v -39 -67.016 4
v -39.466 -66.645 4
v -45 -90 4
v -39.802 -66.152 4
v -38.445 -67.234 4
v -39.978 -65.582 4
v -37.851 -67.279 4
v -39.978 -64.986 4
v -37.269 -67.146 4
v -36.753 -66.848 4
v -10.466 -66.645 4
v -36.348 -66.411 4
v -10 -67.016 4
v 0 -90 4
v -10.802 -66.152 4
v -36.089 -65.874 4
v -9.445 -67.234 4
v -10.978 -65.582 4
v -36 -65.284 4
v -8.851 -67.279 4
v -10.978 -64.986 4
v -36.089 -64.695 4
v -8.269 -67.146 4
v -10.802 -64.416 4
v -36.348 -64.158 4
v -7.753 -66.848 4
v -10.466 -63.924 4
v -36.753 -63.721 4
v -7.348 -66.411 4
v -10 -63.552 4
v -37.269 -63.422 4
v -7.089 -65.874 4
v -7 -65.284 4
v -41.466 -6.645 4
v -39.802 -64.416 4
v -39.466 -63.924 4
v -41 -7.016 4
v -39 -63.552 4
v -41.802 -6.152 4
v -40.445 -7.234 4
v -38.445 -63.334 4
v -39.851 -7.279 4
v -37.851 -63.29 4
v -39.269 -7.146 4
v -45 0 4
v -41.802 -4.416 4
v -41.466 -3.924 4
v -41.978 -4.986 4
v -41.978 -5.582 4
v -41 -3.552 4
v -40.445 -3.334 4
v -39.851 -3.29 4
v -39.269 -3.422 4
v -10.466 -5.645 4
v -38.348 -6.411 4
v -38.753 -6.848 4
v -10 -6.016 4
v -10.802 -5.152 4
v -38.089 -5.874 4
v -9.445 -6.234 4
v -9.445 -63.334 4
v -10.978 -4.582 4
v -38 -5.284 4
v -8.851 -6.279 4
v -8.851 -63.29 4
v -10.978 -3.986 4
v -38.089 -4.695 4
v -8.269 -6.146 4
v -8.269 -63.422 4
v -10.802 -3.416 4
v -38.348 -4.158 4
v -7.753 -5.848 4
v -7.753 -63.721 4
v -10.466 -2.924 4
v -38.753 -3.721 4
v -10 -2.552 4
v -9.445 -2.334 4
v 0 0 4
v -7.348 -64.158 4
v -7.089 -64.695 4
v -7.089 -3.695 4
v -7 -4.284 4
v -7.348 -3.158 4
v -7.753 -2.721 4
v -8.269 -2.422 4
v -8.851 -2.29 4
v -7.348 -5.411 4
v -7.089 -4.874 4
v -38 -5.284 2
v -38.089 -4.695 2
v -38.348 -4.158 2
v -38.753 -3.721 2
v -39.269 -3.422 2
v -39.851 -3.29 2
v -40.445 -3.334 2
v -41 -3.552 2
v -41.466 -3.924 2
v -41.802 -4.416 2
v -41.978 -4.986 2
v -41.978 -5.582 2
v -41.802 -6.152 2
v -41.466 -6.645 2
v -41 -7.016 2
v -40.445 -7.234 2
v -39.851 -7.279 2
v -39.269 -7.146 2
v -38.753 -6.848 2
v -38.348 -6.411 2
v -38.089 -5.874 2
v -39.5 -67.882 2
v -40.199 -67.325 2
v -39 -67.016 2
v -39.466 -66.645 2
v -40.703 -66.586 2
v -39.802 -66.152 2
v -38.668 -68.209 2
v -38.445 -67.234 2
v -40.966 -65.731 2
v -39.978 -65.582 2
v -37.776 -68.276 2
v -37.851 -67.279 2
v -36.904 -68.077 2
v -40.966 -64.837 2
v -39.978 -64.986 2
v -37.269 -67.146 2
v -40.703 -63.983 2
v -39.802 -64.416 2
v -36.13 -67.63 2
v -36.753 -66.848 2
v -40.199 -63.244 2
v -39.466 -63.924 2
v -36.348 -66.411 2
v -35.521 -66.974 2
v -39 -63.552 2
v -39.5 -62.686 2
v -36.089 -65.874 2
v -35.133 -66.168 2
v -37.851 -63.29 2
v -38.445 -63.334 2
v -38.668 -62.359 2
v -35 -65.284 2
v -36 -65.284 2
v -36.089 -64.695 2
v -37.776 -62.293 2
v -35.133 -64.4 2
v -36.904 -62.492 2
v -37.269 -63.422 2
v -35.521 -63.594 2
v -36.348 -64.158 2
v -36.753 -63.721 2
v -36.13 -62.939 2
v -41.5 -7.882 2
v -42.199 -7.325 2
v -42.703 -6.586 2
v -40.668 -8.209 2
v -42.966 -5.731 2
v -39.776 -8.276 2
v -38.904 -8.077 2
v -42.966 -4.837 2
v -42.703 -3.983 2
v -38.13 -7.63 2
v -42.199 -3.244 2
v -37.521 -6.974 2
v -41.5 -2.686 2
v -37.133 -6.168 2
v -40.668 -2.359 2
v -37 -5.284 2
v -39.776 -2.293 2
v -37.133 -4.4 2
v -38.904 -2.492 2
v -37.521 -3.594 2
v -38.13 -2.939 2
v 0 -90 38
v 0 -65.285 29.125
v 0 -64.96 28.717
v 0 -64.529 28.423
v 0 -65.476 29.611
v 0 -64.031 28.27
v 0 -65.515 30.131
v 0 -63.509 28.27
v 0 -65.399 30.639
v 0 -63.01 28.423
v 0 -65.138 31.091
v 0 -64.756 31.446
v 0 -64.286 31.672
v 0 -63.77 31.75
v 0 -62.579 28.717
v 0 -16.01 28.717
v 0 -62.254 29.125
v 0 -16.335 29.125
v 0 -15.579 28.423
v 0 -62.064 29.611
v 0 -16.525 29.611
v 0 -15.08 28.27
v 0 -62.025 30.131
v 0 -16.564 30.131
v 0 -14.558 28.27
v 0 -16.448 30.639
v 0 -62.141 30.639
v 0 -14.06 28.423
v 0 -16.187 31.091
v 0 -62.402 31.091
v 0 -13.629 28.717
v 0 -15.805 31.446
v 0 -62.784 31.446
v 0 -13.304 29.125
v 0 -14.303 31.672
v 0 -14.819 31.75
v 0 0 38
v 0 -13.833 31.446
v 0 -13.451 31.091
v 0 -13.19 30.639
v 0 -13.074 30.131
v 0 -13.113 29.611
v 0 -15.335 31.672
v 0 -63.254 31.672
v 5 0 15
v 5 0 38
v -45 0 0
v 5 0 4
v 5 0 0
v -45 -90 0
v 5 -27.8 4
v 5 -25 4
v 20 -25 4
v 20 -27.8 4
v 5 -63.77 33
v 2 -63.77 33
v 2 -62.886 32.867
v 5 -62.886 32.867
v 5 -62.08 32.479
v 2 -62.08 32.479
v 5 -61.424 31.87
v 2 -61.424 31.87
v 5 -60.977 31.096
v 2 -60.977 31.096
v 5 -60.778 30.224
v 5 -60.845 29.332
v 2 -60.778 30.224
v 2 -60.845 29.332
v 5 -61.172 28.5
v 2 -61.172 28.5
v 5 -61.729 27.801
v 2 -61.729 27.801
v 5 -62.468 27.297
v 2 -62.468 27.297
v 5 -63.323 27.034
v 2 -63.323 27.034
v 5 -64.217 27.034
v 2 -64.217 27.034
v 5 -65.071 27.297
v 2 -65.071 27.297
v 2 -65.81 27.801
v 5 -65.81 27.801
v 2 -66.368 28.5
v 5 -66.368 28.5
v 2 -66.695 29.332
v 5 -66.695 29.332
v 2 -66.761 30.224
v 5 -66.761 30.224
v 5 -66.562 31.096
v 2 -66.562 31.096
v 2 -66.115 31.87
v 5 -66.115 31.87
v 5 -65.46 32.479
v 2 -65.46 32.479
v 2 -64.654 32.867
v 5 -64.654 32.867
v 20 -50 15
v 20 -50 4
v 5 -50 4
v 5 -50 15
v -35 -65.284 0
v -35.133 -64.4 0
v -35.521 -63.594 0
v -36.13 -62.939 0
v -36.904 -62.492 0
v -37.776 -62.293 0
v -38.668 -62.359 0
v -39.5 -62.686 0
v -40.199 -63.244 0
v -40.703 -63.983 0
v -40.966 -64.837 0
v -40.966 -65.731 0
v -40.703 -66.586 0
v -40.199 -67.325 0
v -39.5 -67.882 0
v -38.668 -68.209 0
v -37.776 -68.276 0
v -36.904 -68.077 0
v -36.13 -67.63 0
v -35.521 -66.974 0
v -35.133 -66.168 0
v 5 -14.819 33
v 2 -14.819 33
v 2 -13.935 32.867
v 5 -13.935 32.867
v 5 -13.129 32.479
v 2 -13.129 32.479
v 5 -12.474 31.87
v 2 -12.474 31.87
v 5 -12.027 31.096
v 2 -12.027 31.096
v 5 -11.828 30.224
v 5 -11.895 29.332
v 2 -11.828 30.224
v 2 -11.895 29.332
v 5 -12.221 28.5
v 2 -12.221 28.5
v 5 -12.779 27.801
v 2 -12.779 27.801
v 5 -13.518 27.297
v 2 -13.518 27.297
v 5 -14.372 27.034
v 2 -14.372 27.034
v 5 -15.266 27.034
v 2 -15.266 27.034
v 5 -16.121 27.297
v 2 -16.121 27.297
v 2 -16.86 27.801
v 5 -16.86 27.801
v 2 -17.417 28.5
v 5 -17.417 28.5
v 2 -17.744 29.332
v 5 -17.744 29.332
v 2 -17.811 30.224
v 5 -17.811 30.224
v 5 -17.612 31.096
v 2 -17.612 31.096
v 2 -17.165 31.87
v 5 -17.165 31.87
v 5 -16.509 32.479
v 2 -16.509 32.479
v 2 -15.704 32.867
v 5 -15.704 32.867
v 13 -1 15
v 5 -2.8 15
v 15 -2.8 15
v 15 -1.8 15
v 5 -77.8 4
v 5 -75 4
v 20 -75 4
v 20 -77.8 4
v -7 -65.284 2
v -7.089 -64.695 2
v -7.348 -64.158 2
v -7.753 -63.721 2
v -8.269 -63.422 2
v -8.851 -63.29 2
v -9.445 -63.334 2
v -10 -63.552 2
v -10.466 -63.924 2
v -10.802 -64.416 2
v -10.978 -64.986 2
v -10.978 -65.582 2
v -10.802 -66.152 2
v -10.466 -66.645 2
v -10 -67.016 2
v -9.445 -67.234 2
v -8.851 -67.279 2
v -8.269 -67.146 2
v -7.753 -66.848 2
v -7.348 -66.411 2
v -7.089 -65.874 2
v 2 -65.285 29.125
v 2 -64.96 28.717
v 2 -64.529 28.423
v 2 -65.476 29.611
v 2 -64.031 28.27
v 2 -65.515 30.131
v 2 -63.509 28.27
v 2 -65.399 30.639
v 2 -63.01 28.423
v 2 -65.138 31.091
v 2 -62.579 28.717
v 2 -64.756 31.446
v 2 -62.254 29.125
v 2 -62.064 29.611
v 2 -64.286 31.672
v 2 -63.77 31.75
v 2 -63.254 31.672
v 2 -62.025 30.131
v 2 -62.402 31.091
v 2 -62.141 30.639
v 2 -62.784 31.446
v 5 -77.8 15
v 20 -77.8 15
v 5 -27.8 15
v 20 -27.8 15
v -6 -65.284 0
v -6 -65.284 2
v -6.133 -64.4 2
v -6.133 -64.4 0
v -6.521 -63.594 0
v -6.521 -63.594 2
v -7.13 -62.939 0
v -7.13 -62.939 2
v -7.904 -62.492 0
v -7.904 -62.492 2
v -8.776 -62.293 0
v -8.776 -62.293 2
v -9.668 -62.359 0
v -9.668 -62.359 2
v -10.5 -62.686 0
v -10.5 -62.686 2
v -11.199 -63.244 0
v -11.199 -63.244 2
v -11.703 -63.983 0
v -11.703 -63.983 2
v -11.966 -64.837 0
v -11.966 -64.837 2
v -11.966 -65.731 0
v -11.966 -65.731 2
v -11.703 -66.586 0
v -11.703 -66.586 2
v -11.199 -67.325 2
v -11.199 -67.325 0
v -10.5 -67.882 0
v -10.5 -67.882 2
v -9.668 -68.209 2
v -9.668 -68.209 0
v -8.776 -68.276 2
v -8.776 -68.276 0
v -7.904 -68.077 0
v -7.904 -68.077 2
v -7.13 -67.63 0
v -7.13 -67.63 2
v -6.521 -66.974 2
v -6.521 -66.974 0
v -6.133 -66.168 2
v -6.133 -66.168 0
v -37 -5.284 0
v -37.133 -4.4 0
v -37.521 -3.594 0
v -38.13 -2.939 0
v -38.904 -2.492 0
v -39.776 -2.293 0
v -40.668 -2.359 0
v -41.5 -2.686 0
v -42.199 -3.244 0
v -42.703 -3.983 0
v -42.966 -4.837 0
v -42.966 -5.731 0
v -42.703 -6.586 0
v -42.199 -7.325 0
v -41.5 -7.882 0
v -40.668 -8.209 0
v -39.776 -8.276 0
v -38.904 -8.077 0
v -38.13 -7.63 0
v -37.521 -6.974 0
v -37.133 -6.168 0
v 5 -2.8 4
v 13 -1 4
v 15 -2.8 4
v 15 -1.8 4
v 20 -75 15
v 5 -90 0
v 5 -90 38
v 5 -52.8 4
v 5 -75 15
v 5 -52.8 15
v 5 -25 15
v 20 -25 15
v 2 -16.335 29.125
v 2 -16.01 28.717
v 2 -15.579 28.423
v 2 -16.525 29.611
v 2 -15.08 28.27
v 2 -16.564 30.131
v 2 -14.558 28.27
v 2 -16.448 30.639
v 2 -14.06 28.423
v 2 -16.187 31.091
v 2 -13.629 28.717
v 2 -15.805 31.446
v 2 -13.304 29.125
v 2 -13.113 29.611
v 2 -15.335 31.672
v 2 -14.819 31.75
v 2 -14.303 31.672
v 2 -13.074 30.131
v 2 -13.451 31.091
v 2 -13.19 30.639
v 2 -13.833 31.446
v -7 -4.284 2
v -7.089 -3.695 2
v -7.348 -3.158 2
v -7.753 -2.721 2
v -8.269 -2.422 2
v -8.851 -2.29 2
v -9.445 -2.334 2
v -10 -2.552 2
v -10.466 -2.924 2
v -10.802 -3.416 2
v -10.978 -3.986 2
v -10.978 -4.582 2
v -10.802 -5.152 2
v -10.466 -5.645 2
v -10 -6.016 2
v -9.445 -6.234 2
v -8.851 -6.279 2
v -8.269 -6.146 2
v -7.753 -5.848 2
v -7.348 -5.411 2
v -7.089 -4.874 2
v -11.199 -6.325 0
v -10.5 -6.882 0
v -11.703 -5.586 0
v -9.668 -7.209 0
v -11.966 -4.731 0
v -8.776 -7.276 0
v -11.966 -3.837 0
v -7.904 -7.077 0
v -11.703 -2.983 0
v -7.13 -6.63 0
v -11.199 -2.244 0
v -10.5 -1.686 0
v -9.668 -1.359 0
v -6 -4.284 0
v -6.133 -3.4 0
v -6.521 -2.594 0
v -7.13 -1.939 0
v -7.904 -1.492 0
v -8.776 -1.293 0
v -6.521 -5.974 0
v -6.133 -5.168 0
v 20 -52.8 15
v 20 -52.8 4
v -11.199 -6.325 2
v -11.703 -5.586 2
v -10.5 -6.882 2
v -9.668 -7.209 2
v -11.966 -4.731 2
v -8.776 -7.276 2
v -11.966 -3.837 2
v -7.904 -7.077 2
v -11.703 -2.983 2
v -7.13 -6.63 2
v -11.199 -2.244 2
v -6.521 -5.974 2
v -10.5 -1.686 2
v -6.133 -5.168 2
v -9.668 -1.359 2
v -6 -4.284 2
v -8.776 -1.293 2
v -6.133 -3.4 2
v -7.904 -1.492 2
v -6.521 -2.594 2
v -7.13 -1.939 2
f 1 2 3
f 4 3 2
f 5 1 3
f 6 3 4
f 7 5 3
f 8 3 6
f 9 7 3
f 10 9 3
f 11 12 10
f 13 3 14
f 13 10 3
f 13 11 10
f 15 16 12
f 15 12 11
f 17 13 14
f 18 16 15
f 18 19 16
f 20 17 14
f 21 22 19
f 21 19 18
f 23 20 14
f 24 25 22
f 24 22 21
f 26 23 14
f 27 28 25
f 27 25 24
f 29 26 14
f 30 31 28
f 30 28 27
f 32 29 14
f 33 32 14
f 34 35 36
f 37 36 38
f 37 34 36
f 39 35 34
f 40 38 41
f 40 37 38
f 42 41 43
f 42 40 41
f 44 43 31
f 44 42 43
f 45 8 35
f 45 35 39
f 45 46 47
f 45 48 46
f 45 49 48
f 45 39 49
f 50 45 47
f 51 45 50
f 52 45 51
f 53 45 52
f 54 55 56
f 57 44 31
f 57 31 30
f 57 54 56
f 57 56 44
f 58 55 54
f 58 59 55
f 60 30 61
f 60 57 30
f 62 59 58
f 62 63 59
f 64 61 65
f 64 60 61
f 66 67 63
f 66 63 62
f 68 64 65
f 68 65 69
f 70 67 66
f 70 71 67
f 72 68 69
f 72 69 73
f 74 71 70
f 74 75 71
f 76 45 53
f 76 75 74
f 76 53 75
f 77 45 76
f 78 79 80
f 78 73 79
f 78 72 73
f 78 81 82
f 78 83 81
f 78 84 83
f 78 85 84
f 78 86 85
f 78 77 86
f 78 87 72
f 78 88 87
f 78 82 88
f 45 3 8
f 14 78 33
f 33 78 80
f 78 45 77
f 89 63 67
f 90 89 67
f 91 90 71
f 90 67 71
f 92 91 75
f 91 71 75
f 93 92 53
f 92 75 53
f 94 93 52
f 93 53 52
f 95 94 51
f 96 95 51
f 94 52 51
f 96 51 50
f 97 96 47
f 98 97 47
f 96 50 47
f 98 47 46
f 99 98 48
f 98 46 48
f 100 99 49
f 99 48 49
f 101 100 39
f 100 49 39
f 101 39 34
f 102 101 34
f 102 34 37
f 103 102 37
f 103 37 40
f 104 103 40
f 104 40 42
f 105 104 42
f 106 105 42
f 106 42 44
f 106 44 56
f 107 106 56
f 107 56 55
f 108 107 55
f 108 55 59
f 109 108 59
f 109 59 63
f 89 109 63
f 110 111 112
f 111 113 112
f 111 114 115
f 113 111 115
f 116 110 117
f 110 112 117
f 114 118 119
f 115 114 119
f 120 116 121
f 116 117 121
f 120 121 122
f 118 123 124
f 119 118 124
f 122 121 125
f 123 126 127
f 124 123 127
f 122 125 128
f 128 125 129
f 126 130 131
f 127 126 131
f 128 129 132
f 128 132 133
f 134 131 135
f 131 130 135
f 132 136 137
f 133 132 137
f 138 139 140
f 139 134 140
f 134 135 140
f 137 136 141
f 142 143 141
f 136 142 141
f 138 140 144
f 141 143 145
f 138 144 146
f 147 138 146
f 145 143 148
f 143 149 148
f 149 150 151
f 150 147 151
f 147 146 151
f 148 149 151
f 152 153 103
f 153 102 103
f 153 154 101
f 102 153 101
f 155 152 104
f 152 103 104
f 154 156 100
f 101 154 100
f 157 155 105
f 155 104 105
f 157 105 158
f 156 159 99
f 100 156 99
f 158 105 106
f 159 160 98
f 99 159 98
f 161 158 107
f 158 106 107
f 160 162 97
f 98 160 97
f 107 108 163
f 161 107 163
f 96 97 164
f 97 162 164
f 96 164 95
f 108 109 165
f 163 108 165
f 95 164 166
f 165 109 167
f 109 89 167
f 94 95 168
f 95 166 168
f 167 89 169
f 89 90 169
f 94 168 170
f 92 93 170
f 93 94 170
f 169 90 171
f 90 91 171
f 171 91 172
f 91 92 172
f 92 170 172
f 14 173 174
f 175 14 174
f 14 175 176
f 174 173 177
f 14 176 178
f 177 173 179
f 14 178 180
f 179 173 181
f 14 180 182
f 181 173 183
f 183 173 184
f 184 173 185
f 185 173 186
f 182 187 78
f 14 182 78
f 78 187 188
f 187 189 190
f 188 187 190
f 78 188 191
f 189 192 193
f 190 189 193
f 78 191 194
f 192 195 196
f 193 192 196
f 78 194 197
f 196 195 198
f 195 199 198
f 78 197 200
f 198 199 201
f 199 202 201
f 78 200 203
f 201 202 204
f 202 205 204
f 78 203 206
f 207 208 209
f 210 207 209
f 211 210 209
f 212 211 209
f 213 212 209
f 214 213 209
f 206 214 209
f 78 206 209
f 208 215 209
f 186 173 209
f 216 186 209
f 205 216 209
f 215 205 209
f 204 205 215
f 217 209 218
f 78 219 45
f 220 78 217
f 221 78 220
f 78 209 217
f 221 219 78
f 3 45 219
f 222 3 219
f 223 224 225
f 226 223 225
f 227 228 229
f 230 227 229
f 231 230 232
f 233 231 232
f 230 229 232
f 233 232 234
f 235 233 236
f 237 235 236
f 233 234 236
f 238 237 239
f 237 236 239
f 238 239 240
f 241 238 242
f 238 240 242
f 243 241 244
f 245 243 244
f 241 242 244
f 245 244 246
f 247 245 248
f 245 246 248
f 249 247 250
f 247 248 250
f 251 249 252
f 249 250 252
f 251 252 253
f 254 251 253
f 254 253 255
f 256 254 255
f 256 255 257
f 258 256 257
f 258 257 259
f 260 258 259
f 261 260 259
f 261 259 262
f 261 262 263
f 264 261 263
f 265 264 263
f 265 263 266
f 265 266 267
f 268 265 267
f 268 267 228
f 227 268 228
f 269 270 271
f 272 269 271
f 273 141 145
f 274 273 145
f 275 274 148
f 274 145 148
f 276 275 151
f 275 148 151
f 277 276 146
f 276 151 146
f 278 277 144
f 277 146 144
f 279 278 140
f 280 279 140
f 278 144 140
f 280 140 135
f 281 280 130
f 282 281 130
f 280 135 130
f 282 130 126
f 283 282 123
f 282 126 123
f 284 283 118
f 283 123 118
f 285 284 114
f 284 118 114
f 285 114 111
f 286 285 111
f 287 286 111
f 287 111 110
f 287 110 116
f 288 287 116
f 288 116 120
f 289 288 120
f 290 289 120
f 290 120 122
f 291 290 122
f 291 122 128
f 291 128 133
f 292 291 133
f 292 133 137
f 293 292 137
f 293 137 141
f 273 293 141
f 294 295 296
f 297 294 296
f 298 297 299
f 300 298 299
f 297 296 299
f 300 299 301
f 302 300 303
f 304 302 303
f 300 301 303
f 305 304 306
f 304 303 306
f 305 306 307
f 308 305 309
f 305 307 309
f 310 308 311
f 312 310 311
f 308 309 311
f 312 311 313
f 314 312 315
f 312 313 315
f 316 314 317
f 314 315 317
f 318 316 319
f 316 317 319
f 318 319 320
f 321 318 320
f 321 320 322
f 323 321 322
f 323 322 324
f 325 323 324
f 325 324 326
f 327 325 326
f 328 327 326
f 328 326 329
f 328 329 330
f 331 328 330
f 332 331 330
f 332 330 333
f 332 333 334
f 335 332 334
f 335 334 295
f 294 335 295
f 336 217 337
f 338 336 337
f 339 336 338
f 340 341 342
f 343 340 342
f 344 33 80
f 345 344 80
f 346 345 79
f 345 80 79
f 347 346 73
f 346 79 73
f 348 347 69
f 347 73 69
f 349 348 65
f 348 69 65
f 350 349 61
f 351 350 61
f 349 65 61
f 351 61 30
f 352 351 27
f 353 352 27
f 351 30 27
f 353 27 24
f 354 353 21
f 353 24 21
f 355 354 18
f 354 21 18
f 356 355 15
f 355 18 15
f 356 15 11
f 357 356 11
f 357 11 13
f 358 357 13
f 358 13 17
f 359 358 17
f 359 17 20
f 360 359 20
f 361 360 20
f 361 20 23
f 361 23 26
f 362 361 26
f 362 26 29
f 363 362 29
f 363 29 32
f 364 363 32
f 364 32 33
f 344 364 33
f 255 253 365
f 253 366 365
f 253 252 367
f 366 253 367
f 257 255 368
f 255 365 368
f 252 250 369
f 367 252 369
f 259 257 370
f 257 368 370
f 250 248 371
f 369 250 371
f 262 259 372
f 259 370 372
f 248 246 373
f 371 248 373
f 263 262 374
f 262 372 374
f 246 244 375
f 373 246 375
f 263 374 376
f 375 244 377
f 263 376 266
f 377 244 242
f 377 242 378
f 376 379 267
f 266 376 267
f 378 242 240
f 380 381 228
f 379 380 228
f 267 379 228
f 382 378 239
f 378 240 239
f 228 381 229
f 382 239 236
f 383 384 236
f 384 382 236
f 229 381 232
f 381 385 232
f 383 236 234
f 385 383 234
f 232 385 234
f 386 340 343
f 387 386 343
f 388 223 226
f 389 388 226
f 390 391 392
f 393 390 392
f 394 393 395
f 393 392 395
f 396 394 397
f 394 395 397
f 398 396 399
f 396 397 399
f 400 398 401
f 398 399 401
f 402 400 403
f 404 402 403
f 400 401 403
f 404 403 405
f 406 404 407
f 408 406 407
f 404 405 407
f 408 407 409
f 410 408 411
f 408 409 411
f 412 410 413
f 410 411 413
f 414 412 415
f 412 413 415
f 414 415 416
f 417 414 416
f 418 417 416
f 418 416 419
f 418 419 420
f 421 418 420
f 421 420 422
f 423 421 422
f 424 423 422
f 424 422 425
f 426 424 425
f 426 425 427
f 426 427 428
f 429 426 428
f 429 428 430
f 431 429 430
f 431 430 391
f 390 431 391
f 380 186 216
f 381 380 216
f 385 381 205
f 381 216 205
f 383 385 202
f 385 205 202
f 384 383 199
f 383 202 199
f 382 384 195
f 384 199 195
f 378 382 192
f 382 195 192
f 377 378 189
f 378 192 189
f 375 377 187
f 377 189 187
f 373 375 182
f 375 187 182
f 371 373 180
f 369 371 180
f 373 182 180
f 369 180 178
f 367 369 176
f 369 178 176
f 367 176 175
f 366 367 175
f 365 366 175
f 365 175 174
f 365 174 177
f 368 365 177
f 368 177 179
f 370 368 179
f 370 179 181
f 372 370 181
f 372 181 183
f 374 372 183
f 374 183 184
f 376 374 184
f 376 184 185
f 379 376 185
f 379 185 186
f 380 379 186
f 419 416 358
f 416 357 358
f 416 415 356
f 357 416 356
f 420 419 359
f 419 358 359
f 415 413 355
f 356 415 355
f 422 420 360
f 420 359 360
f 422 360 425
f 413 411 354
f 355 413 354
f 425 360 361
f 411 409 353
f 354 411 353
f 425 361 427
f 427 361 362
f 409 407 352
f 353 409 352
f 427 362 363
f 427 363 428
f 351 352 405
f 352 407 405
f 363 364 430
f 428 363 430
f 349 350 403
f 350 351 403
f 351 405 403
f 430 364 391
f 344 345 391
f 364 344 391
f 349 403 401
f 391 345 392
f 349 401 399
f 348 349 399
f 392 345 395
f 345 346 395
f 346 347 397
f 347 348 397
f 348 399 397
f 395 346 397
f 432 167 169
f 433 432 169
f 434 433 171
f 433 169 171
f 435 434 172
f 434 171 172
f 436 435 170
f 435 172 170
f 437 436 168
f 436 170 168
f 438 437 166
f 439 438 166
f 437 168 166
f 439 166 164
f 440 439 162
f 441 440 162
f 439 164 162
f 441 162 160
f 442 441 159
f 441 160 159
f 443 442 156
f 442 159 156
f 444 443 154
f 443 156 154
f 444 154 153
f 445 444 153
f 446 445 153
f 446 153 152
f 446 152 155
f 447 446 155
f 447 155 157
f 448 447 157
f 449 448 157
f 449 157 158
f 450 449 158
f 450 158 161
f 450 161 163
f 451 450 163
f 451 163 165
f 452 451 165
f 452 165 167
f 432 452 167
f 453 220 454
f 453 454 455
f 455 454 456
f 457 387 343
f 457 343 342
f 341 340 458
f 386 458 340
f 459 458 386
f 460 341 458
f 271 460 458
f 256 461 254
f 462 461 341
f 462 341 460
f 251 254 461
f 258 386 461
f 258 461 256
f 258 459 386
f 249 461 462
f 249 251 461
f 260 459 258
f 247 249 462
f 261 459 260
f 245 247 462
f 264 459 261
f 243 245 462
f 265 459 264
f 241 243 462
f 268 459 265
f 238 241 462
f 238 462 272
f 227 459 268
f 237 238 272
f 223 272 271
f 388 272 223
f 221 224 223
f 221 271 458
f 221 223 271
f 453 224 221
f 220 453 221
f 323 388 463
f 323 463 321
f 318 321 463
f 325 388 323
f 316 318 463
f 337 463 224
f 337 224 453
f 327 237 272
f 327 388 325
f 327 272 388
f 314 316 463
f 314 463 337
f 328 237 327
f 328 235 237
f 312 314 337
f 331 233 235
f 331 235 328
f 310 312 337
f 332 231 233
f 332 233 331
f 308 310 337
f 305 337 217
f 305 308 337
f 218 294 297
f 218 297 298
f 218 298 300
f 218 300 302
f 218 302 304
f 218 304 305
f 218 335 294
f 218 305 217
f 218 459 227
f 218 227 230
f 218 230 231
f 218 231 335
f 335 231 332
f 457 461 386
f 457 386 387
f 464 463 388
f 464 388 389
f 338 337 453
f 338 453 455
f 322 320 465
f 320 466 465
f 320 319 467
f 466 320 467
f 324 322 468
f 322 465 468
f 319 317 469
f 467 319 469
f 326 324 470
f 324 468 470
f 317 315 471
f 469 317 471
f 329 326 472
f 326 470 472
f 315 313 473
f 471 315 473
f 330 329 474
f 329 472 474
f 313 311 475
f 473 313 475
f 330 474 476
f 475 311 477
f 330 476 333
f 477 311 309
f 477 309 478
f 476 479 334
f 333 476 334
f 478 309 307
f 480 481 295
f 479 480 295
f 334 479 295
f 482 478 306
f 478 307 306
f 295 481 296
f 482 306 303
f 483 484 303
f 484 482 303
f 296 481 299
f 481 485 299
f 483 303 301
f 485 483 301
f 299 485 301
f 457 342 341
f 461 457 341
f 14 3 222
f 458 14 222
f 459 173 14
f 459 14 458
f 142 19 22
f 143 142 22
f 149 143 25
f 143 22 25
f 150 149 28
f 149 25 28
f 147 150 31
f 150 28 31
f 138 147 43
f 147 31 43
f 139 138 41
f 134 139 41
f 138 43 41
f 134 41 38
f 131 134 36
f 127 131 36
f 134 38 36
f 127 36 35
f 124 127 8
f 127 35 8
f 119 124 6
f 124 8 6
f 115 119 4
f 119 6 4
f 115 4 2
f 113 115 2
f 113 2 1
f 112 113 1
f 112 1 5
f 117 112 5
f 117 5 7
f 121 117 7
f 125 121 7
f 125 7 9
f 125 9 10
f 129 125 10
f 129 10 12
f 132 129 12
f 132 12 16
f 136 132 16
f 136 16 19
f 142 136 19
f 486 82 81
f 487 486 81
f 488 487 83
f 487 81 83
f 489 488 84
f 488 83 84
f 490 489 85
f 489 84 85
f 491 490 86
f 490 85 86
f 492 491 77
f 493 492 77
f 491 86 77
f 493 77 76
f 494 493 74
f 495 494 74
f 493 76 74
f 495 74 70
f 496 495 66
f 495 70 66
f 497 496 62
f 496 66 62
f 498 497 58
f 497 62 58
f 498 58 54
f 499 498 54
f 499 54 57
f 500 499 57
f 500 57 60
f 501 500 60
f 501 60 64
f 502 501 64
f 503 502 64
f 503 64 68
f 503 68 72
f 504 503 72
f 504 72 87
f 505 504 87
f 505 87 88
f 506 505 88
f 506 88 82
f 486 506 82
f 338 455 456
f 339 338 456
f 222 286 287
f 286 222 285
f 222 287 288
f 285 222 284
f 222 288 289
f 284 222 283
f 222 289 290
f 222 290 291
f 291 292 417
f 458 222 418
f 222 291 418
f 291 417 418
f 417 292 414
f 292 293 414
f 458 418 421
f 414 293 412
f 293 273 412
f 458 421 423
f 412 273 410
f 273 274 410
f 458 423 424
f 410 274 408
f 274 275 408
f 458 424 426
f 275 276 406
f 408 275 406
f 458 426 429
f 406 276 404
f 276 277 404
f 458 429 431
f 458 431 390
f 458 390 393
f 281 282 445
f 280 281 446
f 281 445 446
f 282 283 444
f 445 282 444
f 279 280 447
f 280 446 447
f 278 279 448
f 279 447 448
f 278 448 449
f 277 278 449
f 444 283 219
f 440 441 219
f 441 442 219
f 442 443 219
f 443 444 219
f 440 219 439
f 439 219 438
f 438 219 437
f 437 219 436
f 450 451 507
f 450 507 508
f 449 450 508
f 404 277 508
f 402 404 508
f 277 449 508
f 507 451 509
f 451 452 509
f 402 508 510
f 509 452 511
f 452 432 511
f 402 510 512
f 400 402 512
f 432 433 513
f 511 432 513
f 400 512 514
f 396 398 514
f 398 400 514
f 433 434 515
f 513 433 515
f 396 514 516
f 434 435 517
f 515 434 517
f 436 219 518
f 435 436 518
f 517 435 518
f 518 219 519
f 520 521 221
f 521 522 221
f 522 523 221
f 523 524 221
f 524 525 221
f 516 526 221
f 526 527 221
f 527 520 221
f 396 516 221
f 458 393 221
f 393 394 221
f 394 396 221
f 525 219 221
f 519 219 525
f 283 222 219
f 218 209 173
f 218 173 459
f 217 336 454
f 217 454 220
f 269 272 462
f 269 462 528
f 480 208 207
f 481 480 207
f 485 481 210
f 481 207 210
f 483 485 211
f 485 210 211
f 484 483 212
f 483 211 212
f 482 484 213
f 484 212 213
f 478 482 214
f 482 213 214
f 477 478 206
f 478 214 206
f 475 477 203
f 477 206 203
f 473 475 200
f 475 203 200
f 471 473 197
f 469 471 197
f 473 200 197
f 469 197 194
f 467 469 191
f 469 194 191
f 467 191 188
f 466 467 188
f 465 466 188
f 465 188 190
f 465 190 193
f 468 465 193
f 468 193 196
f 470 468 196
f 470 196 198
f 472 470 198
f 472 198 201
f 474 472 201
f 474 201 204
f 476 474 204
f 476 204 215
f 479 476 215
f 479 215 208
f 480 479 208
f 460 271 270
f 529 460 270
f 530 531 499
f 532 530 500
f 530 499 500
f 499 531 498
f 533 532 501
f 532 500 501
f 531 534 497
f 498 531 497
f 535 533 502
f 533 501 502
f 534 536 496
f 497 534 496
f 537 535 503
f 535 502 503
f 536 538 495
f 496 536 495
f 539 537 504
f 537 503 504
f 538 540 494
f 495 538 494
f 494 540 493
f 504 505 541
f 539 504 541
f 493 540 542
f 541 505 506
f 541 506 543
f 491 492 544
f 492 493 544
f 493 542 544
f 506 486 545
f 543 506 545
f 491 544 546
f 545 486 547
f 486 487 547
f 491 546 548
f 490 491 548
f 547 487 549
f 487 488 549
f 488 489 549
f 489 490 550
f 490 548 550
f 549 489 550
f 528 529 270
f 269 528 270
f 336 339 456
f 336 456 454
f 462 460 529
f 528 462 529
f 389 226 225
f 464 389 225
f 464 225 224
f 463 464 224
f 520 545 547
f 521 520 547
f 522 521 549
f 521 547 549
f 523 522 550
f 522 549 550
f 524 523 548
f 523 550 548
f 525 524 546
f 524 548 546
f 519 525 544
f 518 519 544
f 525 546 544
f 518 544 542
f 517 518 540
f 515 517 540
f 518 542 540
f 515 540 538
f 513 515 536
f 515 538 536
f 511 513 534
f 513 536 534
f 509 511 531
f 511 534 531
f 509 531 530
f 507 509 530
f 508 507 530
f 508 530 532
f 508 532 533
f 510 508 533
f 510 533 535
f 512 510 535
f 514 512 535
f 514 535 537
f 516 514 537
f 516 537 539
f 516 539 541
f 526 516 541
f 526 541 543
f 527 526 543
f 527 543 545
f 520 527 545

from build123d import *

# Parameters (mm, degrees)
EXTRUDE_1_DEPTH     = 38
EXTRUDE_1_2_DEPTH   = 38
EXTRUDE_7_DEPTH     = 38
SKETCH_13_W         = 45
SKETCH_13_H         = 4
EXTRUDE_9_DEPTH     = 90
SKETCH_1_4_W        = 5
SKETCH_1_4_H        = 2.2
EXTRUDE_10_DEPTH    = 38
SKETCH_11_R         = 1.75
CUT_EXTRUDE_2_DEPTH = 38
CUT_EXTRUDE_START   = -2
SKETCH_11_3_R       = 3
SKETCH_11_3_R_2     = 1.75
CUT_EXTRUDE_3_DEPTH = 38
SKETCH_15_R         = 2
CUT_EXTRUDE_4_DEPTH = 38
SKETCH_15_3_R       = 3
SKETCH_15_3_R_2     = 2
CUT_EXTRUDE_5_DEPTH = 38
SKETCH_17_W         = 15
SKETCH_17_H         = 2.8
EXTRUDE_12_DEPTH    = 23
SKETCH_18_W         = 2
SKETCH_18_H         = 1
CUT_EXTRUDE_6_DEPTH = 40
SKETCH_17_2_W       = 15
SKETCH_17_2_H       = 2.8
SKETCH_17_2_W_2     = 10
SKETCH_17_2_H_2     = 3.8
CUT_EXTRUDE_7_DEPTH = 23
SKETCH_20_W         = 15
SKETCH_20_H         = 4
CUT_EXTRUDE_8_DEPTH = 89
SKETCH_17_4_W       = 5
SKETCH_17_4_H       = 10
EXTRUDE_13_DEPTH    = 38


with BuildPart() as part:
    # 스케치1 → 보스-돌출1 (new body)
    with BuildSketch(Plane.XY):
        Polygon((15, -3.8), (15, -1.8), (13, -1), (13, -3.8), align=None)
    extrude(amount=EXTRUDE_1_DEPTH)



with BuildPart() as body_2:
    # 스케치1 → Extrude 1 2 (new body)
    with BuildSketch(Plane.XY):
        Polygon((5, -75), (5, -52.8), (20, -52.8), (20, -50), (5, -50), (5, -27.8), (20, -27.8), (20, -25), (5, -25), (5, 0), (0, 0), (0, -77.8), (20, -77.8), (20, -75), align=None)
    extrude(amount=EXTRUDE_1_2_DEPTH)


with BuildPart() as part_1:
    add(part.part)

    add(body_2.part)  # 보스-돌출7 merges body 2
    # 스케치1<3> → 보스-돌출7 (add)
    with BuildSketch(Plane.XY):
        Polygon((13, -2.8), (13, -1), (5, 0), (5, -0.74611229), (5, -2.8), align=None)
    extrude(amount=EXTRUDE_7_DEPTH)

    # 스케치13 → 보스-돌출9 (add)
    with BuildSketch(Plane(origin=(0, 0, 0), x_dir=(1, 0, 0), z_dir=(0, 1, 0))):
        with Locations((-22.5, -2)):
            Rectangle(SKETCH_13_W, SKETCH_13_H)
    extrude(amount=-EXTRUDE_9_DEPTH)

    # 스케치1<4> → 보스-돌출10 (add)
    with BuildSketch(Plane.XY):
        with Locations((2.5, -78.9)):
            Rectangle(SKETCH_1_4_W, SKETCH_1_4_H)
    extrude(amount=EXTRUDE_10_DEPTH)

    # 스케치11 → 컷-돌출2 (cut)
    with BuildSketch(Plane.ZY):
        with Locations((30, -63.769774624)):
            Circle(SKETCH_11_R)
        with Locations((30, -14.819294268)):
            Circle(SKETCH_11_R)
    extrude(amount=-CUT_EXTRUDE_2_DEPTH, mode=Mode.SUBTRACT)

    # 스케치11<3> → 컷-돌출3 (cut)
    with BuildSketch(Plane.ZY.offset(CUT_EXTRUDE_START)):
        with Locations((30, -63.769774624)):
            Circle(SKETCH_11_3_R)
        with Locations((30, -63.769774624)):
            Circle(SKETCH_11_3_R_2, mode=Mode.SUBTRACT)
        with Locations((30, -14.819294268)):
            Circle(SKETCH_11_3_R)
        with Locations((30, -14.819294268)):
            Circle(SKETCH_11_3_R_2, mode=Mode.SUBTRACT)
    extrude(amount=-CUT_EXTRUDE_3_DEPTH, mode=Mode.SUBTRACT)

    # 스케치15 → 컷-돌출4 (cut)
    with BuildSketch(Plane.XY.offset(4)):
        with Locations((-40, -5.284222689)):
            Circle(SKETCH_15_R)
        with Locations((-9, -4.284222689)):
            Circle(SKETCH_15_R)
        with Locations((-9, -65.284222689)):
            Circle(SKETCH_15_R)
        with Locations((-38, -65.284222689)):
            Circle(SKETCH_15_R)
    extrude(amount=-CUT_EXTRUDE_4_DEPTH, mode=Mode.SUBTRACT)

    # 스케치15<3> → 컷-돌출5 (cut)
    with BuildSketch(Plane.XY.offset(4).offset(CUT_EXTRUDE_START)):
        with Locations((-40, -5.284222689)):
            Circle(SKETCH_15_3_R)
        with Locations((-40, -5.284222689)):
            Circle(SKETCH_15_3_R_2, mode=Mode.SUBTRACT)
        with Locations((-38, -65.284222689)):
            Circle(SKETCH_15_3_R)
        with Locations((-38, -65.284222689)):
            Circle(SKETCH_15_3_R_2, mode=Mode.SUBTRACT)
        with Locations((-9, -65.284222689)):
            Circle(SKETCH_15_3_R)
        with Locations((-9, -65.284222689)):
            Circle(SKETCH_15_3_R_2, mode=Mode.SUBTRACT)
        with Locations((-9, -4.284222689)):
            Circle(SKETCH_15_3_R)
        with Locations((-9, -4.284222689)):
            Circle(SKETCH_15_3_R_2, mode=Mode.SUBTRACT)
    extrude(amount=-CUT_EXTRUDE_5_DEPTH, mode=Mode.SUBTRACT)

    # 스케치17 → 보스-돌출12 (add)
    with BuildSketch(Plane.XY.offset(38)):
        with Locations((12.5, -26.4)):
            Rectangle(SKETCH_17_W, SKETCH_17_H)
        with Locations((12.5, -51.4)):
            Rectangle(SKETCH_17_W, SKETCH_17_H)
        with Locations((12.5, -76.4)):
            Rectangle(SKETCH_17_W, SKETCH_17_H)
    extrude(amount=-EXTRUDE_12_DEPTH)

    # 스케치18 → 컷-돌출6 (cut)
    with BuildSketch(Plane.XY.offset(38)):
        with Locations((14, -3.3)):
            Rectangle(SKETCH_18_W, SKETCH_18_H)
    extrude(amount=-CUT_EXTRUDE_6_DEPTH, mode=Mode.SUBTRACT)

    # 스케치17<2> → 컷-돌출7 (cut)
    with BuildSketch(Plane.XY.offset(38)):
        with Locations((12.5, -76.4)):
            Rectangle(SKETCH_17_2_W, SKETCH_17_2_H)
        with Locations((12.5, -51.4)):
            Rectangle(SKETCH_17_2_W, SKETCH_17_2_H)
        with Locations((12.5, -26.4)):
            Rectangle(SKETCH_17_2_W, SKETCH_17_2_H)
        with Locations((10, -1.9)):
            Rectangle(SKETCH_17_2_W_2, SKETCH_17_2_H_2)
    extrude(amount=-CUT_EXTRUDE_7_DEPTH, mode=Mode.SUBTRACT)

    # 스케치20 → 컷-돌출8 (cut)
    with BuildSketch(Plane(origin=(0, 0, 0), x_dir=(1, 0, 0), z_dir=(0, 1, 0))):
        with Locations((12.5, -2)):
            Rectangle(SKETCH_20_W, SKETCH_20_H)
    extrude(amount=-CUT_EXTRUDE_8_DEPTH, mode=Mode.SUBTRACT)

    # 스케치17<4> → 보스-돌출13 (add)
    with BuildSketch(Plane.XY.offset(38)):
        with Locations((2.5, -85)):
            Rectangle(SKETCH_17_4_W, SKETCH_17_4_H)
    extrude(amount=-EXTRUDE_13_DEPTH)


solid = part_1.part
